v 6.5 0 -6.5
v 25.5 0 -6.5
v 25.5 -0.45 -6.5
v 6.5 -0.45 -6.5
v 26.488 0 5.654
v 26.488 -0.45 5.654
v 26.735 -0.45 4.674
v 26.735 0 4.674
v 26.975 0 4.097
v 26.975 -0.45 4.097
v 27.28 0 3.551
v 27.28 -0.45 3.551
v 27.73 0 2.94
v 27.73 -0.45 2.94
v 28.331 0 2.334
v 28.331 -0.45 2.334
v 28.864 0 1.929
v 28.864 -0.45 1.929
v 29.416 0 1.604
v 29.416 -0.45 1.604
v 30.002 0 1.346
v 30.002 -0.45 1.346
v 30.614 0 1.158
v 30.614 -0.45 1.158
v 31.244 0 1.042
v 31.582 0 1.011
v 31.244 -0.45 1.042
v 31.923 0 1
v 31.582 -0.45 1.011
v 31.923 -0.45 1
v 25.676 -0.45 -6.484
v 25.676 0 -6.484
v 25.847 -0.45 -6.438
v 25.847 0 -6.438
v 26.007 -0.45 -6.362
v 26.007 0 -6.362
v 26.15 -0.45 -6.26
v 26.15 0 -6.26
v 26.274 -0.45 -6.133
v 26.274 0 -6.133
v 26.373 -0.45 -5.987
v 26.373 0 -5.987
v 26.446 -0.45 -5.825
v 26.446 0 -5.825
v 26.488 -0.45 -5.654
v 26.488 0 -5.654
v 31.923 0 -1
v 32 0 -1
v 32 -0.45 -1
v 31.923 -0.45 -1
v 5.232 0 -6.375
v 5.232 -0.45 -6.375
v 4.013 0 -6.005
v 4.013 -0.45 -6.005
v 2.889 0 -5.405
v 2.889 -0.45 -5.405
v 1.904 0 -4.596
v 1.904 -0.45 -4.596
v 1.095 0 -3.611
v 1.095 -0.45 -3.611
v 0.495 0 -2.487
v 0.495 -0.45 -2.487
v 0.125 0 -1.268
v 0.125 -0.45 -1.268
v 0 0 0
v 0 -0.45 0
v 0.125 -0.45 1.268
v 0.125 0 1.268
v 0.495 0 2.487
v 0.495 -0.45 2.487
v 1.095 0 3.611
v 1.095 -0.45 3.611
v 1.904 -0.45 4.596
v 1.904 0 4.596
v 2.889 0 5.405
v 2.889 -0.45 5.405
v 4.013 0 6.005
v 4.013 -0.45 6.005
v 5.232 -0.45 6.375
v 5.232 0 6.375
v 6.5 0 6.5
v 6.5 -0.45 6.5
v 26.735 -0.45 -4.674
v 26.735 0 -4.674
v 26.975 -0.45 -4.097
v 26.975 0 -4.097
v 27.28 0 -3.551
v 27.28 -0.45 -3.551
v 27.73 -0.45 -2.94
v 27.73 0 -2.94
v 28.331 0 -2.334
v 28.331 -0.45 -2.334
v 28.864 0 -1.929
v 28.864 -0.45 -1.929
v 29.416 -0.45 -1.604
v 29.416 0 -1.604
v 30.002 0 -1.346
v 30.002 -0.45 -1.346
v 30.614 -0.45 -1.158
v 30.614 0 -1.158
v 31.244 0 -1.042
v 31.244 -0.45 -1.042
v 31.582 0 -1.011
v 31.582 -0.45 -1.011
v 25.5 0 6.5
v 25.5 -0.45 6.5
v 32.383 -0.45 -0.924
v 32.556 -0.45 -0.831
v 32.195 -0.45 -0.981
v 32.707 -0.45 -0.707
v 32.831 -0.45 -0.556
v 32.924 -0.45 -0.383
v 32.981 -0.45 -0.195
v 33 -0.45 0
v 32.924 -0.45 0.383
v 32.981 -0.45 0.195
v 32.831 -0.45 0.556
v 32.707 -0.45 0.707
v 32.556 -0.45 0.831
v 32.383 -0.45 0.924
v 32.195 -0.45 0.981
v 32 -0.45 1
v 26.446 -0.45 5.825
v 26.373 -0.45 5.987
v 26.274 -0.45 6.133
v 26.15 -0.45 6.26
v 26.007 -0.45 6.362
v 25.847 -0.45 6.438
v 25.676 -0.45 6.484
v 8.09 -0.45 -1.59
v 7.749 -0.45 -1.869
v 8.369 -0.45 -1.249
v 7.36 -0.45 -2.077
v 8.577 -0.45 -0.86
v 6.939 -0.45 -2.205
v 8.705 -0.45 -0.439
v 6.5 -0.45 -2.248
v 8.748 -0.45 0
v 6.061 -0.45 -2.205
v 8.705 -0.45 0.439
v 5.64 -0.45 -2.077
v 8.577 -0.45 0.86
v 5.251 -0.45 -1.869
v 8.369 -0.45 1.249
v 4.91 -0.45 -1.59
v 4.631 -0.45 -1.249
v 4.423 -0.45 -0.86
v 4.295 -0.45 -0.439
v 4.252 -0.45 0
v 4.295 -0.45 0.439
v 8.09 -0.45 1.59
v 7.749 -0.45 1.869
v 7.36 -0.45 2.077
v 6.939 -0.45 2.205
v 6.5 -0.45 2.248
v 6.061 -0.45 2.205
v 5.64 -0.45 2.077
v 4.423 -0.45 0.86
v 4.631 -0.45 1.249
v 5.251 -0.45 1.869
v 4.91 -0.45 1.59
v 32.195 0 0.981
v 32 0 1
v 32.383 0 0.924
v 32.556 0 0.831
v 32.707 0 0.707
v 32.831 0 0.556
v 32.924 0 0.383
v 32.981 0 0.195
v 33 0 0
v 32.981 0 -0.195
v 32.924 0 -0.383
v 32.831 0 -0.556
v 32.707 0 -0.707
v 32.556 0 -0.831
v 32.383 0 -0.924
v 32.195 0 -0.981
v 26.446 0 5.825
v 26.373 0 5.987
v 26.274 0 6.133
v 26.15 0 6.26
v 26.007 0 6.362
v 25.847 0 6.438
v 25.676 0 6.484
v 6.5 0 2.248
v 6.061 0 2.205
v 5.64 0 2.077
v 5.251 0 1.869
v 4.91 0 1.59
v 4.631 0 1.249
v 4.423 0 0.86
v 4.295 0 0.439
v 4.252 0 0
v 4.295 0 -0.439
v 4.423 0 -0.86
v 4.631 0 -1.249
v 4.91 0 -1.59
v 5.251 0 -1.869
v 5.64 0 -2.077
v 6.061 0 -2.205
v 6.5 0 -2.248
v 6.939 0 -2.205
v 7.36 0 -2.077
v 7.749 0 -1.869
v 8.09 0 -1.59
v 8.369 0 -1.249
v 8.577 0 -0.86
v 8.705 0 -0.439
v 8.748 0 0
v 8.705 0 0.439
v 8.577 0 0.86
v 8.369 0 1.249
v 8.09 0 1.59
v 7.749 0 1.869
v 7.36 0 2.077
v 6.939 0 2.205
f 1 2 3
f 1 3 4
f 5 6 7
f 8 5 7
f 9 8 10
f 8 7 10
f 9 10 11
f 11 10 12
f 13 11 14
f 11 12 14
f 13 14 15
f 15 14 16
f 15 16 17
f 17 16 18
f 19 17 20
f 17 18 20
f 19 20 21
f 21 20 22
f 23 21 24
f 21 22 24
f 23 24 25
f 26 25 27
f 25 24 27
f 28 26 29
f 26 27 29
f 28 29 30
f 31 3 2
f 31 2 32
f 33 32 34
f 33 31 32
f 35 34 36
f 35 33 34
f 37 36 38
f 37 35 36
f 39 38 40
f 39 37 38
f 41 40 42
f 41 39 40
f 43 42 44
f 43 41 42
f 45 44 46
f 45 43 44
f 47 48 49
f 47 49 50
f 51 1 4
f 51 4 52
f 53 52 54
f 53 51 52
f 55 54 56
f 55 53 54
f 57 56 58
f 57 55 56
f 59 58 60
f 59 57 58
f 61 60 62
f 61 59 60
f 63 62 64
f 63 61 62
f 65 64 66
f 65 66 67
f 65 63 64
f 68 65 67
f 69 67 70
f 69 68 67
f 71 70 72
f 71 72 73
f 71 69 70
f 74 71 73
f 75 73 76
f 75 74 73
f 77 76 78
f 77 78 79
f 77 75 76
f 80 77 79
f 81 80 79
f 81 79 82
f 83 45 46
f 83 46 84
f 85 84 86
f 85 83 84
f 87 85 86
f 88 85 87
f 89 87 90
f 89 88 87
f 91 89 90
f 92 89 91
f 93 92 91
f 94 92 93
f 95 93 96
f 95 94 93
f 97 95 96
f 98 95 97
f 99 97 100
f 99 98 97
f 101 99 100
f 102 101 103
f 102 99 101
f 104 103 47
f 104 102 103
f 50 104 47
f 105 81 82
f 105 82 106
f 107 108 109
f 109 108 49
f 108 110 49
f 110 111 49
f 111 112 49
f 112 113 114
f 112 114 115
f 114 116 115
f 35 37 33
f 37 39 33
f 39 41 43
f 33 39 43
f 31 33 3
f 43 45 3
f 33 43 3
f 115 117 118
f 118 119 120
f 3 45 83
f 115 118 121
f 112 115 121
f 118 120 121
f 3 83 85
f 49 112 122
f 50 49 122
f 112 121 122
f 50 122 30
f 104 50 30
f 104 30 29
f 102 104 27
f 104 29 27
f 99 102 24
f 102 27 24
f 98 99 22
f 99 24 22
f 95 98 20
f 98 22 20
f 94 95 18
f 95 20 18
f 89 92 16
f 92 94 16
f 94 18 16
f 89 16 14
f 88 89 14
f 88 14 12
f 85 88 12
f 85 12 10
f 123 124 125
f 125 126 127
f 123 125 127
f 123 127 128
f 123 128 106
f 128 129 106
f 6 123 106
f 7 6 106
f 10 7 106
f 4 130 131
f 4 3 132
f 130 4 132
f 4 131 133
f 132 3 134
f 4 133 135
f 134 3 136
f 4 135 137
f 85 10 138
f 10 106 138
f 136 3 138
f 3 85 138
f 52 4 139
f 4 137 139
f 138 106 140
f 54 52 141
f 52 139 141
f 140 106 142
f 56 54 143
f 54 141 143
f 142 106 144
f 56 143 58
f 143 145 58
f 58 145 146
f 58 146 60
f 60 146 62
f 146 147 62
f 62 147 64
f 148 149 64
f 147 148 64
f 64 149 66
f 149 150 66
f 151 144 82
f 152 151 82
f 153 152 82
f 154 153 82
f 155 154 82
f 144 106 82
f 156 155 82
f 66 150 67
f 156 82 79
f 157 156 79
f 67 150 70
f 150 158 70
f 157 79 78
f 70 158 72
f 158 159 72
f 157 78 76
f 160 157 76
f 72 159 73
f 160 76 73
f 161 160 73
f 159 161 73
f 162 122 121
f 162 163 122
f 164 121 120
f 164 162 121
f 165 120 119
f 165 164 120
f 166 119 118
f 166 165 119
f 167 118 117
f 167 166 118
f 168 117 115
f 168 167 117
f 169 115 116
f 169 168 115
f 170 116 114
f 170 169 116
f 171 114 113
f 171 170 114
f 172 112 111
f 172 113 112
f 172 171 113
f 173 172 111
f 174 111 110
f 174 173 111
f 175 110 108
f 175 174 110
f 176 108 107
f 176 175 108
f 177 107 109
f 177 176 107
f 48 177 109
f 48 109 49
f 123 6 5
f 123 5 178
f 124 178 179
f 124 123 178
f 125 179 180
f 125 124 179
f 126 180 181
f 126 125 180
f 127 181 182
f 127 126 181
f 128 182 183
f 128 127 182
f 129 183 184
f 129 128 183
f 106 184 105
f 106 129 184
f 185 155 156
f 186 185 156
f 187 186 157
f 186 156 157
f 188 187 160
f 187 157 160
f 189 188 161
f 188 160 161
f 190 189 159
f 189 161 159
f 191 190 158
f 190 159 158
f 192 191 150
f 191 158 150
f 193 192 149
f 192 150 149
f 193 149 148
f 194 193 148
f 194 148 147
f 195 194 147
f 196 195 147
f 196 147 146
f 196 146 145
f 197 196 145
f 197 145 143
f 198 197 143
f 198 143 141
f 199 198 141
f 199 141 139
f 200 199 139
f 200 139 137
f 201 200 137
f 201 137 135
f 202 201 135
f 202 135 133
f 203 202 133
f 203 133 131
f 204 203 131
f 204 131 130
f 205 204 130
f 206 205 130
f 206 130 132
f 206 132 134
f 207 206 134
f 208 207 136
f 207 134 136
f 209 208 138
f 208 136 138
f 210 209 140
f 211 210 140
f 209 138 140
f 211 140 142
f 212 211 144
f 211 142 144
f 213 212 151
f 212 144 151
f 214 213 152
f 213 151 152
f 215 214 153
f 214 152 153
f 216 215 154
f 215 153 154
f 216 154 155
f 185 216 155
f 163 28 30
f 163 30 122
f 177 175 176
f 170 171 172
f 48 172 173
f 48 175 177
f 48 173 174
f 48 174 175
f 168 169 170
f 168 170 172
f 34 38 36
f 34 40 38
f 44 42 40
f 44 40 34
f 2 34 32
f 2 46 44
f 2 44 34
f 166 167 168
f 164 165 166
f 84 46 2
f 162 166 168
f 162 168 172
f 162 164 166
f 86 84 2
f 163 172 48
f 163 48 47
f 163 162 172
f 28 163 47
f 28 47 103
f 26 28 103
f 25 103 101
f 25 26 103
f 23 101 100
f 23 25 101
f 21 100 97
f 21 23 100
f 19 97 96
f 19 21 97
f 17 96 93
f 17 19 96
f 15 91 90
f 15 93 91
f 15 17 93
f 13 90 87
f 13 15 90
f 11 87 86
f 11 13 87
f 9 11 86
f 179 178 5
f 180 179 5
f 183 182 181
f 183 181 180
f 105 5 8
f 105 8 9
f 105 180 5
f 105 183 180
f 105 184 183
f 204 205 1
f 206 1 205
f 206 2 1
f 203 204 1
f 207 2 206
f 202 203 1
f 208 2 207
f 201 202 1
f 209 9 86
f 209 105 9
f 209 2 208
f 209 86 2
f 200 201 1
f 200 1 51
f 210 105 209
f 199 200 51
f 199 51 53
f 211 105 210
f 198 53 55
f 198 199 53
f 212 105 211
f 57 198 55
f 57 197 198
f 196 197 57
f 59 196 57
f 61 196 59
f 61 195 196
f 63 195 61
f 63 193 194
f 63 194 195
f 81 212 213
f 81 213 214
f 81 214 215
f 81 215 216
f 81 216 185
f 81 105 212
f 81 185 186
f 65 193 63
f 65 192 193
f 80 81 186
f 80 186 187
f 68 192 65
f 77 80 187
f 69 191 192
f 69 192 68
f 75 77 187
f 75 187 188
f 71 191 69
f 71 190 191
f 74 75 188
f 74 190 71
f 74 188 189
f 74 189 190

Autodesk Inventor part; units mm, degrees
ref_plane "YZ Plane" through (0, 0, 0) normal (1, 0, 0) x (0, 1, 0)
ref_plane "XZ Plane" through (0, 0, 0) normal (0, 1, 0) x (-1, 0, 0)
ref_plane "XY Plane" through (0, 0, 0) normal (0, 0, 1) x (1, 0, 0)
sketch "Sketch1" plane through (0, 0, 0) normal (0, 1, 0) x (-1, 0, 0)
  line L0 (0, 0) -> (-33, 0) construction
  line L1 (-6.5, 6.5) -> (-26.5, 6.5)
  line L2 (-26.5, -6.5) -> (-6.5, -6.5)
  arc A0 (-6.5, -6.5) -> (-6.5, 6.5) centre (-6.5, 0) ccw
  arc A1 (-26.5, 6.5) -> (-26.5, -6.5) centre (-26.5, 0) ccw
  circle A2 centre (-6.5, 0) radius 2
  line L3 (-22.6527, -1.0329) -> (-22.6527, 4.8111) construction
  line L4 (-22.6527, 4.8111) -> (-19.4837, 4.8111) construction
  line L5 (-19.4837, 4.8111) -> (-19.4837, -1.0329) construction
  line L6 (-19.4837, -1.0329) -> (-22.6527, -1.0329) construction
  line L7 (-26.5, 0) -> (-33, 0) construction
  line L8 (-26.5, -6.5) -> (-26.5, 6.5)
  line L9 (-33, 0) -> (-16.5, 0) construction
  line L10 (-32, -1) -> (-17.5, -1)
  line L11 (-17.5, 1) -> (-32, 1)
  arc A3 (-32, 1) -> (-32, -1) centre (-32, 0) ccw
  arc A4 (-17.5, -1) -> (-17.5, 1) centre (-17.5, 0) ccw
  line L12 (-22.6527, 0.0867) -> (-19.5369, 0.0867)
  line L13 (-19.5369, 0.0867) -> (-19.5369, -0.1112)
  line L14 (-19.5369, -0.1112) -> (-22.3445, -0.1112)
  spline S0 degree 2 poles (-22.3445, -0.1112) (-22.2032, -0.2582) (-21.9996, -0.6343) (-21.9204, -0.8576) knots 0 0 0 1 2 2 2
  line L15 (-21.9204, -0.8576) -> (-22.0985, -0.8576)
  spline S1 degree 2 poles (-22.0985, -0.8576) (-22.1438, -0.7219) (-22.2569, -0.4929) (-22.3926, -0.2836) (-22.5566, -0.0857) (-22.6527, 0.0161) knots 0 0 0 1 2 3 4 4 4
  line L16 (-22.6527, 0.0161) -> (-22.6527, 0.0867)
  point P0 (-29.75, 0)
  point P1 (-24.75, 0)
  point P2 (-26.5, -1)
  point P3 (-26.5, 1)
  dimension "d0" = 33
  dimension "d1" = 13
  dimension "d2" = 4
  dimension "d18" = 2
  dimension "d19" = 5.5
extrude "Plate1" add sketch "Sketch1" against normal blind 0.45 contours A0 L2 L8 L10 A4 L11 L1 | A3 L11 L8 L10 | L11 A4 L10 L8 | A2 | L12 L13 L14 S0 L15 S1 L16
hole "Hole1" at (6.5, 0, 0) direction (0, -1, 0) diameter 4.4958 end through all clearance for "Socket Head Cap Screw" size "M4" standard "Ansi Metric M Profile"
emboss "Emboss2" sketch "Sketch1" operation cut depth 0.01 direction (0, -1, 0) draft 45 contours L12 L13 L14 S0 L15 S1 L16
fillet "Fillet1" radius 1 2 edges at (26.5, -0.225, 6.5) (26.5, -0.225, -6.5)
fillet "Fillet3" radius 5.5 2 edges at (26.5, -0.225, 1) (26.5, -0.225, -1)
equation "\"d9\" = Thickness"
equation "\"d20\" = d19"
equation "\"d3\" = Thickness"
equation "\"BendRadius\" = Thickness"
equation "\"BendReliefWidth\" = Thickness"
equation "\"BendReliefDepth\" = 0.5 * Thickness"
equation "\"CornerReliefSize\" = 4 * Thickness"
equation "\"MinimumRemnant\" = 2 * Thickness"
equation "\"TransitionRadius\" = BendRadius"
equation "\"JacobiRadiusSize\" = BendRadius"
equation "\"GapSize\" = Thickness"
equation "\"Thickness\" = 0.45"
properties part number "Part16.5mm" material "Steel, Carbon"
